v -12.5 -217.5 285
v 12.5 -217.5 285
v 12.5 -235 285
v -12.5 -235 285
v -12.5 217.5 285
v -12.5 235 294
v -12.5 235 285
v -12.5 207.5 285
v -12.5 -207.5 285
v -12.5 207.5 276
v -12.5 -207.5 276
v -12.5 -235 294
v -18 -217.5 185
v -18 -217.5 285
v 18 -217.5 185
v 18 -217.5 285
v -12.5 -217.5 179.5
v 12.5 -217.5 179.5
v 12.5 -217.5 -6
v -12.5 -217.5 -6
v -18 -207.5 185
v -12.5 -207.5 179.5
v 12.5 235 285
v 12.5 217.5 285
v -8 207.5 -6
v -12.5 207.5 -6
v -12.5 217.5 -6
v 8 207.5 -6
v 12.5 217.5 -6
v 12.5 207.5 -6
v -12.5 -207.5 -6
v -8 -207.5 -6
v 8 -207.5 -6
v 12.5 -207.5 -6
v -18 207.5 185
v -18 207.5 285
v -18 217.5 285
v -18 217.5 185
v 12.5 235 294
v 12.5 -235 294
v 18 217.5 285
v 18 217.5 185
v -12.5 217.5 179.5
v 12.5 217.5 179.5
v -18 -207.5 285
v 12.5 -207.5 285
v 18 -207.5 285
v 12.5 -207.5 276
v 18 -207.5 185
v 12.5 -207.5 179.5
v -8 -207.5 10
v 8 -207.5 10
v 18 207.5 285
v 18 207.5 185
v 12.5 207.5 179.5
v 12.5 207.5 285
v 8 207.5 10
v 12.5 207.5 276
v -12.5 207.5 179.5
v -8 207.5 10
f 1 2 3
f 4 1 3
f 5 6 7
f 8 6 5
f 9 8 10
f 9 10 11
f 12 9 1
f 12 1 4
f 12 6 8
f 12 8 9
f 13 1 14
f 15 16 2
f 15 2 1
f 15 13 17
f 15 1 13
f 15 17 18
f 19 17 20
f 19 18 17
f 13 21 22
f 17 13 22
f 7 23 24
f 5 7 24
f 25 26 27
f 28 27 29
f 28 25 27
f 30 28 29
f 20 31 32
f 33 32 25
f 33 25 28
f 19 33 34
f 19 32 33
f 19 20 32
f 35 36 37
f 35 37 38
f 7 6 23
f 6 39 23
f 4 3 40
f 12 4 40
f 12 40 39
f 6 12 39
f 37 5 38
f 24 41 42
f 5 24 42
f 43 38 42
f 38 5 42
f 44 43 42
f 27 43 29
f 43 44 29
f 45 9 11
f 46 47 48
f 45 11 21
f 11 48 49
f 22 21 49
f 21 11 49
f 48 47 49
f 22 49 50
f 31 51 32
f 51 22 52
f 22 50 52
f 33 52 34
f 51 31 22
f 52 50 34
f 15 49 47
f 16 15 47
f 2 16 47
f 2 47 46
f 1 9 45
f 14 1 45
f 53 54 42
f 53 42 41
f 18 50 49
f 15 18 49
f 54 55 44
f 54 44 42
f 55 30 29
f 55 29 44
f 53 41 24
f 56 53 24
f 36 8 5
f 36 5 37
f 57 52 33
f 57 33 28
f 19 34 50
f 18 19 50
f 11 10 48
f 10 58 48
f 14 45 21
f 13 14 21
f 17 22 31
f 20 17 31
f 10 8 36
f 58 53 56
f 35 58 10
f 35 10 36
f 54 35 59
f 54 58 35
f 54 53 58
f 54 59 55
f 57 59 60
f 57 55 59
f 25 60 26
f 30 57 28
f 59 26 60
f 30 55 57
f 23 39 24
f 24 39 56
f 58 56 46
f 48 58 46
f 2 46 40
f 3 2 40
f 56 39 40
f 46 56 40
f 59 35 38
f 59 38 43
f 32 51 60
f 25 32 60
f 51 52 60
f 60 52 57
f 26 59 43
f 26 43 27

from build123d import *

# Parameters (mm, degrees)
PAD005_DEPTH = 12.5
PAD006_DEPTH = 10
PAD007_DEPTH = 10
SKETCH012_W  = 415
SKETCH012_H  = 16
PAD008_DEPTH = 8


with BuildPart() as part:
    # Sketch008 → Pad005 (new body, symmetric)
    with BuildSketch(Plane.YZ):
        Polygon((-235, 294), (235, 294), (235, 285), (207.5, 285), (207.5, 276), (-207.5, 276), (-207.5, 285), (-235, 285), align=None)
    extrude(amount=PAD005_DEPTH, both=True)

    # Sketch010 (on Face6 of Pad005) → Pad006 (join)
    with BuildSketch(Plane(origin=(0, -207.5, 0), x_dir=(0, 0, -1), z_dir=(0, -1, 0))):
        Polygon((-285, 18), (-285, -18), (-185, -18), (-179.5, -12.5), (6, -12.5), (6, 12.5), (-179.5, 12.5), (-185, 18), align=None)
    extrude(amount=PAD006_DEPTH)

    # Sketch011 (on Face8 of Pad006) → Pad007 (join)
    with BuildSketch(Plane.ZX.offset(207.5)):
        Polygon((-6, 12.5), (179.5, 12.5), (185, 18), (285, 18), (285, -18), (185, -18), (179.5, -12.5), (-6, -12.5), align=None)
    extrude(amount=PAD007_DEPTH)

    # Sketch012 → Pad008 (join, symmetric)
    with BuildSketch(Plane.YZ):
        with Locations((0, 2)):
            Rectangle(SKETCH012_W, SKETCH012_H)
    extrude(amount=PAD008_DEPTH, both=True)


solid = part.part
